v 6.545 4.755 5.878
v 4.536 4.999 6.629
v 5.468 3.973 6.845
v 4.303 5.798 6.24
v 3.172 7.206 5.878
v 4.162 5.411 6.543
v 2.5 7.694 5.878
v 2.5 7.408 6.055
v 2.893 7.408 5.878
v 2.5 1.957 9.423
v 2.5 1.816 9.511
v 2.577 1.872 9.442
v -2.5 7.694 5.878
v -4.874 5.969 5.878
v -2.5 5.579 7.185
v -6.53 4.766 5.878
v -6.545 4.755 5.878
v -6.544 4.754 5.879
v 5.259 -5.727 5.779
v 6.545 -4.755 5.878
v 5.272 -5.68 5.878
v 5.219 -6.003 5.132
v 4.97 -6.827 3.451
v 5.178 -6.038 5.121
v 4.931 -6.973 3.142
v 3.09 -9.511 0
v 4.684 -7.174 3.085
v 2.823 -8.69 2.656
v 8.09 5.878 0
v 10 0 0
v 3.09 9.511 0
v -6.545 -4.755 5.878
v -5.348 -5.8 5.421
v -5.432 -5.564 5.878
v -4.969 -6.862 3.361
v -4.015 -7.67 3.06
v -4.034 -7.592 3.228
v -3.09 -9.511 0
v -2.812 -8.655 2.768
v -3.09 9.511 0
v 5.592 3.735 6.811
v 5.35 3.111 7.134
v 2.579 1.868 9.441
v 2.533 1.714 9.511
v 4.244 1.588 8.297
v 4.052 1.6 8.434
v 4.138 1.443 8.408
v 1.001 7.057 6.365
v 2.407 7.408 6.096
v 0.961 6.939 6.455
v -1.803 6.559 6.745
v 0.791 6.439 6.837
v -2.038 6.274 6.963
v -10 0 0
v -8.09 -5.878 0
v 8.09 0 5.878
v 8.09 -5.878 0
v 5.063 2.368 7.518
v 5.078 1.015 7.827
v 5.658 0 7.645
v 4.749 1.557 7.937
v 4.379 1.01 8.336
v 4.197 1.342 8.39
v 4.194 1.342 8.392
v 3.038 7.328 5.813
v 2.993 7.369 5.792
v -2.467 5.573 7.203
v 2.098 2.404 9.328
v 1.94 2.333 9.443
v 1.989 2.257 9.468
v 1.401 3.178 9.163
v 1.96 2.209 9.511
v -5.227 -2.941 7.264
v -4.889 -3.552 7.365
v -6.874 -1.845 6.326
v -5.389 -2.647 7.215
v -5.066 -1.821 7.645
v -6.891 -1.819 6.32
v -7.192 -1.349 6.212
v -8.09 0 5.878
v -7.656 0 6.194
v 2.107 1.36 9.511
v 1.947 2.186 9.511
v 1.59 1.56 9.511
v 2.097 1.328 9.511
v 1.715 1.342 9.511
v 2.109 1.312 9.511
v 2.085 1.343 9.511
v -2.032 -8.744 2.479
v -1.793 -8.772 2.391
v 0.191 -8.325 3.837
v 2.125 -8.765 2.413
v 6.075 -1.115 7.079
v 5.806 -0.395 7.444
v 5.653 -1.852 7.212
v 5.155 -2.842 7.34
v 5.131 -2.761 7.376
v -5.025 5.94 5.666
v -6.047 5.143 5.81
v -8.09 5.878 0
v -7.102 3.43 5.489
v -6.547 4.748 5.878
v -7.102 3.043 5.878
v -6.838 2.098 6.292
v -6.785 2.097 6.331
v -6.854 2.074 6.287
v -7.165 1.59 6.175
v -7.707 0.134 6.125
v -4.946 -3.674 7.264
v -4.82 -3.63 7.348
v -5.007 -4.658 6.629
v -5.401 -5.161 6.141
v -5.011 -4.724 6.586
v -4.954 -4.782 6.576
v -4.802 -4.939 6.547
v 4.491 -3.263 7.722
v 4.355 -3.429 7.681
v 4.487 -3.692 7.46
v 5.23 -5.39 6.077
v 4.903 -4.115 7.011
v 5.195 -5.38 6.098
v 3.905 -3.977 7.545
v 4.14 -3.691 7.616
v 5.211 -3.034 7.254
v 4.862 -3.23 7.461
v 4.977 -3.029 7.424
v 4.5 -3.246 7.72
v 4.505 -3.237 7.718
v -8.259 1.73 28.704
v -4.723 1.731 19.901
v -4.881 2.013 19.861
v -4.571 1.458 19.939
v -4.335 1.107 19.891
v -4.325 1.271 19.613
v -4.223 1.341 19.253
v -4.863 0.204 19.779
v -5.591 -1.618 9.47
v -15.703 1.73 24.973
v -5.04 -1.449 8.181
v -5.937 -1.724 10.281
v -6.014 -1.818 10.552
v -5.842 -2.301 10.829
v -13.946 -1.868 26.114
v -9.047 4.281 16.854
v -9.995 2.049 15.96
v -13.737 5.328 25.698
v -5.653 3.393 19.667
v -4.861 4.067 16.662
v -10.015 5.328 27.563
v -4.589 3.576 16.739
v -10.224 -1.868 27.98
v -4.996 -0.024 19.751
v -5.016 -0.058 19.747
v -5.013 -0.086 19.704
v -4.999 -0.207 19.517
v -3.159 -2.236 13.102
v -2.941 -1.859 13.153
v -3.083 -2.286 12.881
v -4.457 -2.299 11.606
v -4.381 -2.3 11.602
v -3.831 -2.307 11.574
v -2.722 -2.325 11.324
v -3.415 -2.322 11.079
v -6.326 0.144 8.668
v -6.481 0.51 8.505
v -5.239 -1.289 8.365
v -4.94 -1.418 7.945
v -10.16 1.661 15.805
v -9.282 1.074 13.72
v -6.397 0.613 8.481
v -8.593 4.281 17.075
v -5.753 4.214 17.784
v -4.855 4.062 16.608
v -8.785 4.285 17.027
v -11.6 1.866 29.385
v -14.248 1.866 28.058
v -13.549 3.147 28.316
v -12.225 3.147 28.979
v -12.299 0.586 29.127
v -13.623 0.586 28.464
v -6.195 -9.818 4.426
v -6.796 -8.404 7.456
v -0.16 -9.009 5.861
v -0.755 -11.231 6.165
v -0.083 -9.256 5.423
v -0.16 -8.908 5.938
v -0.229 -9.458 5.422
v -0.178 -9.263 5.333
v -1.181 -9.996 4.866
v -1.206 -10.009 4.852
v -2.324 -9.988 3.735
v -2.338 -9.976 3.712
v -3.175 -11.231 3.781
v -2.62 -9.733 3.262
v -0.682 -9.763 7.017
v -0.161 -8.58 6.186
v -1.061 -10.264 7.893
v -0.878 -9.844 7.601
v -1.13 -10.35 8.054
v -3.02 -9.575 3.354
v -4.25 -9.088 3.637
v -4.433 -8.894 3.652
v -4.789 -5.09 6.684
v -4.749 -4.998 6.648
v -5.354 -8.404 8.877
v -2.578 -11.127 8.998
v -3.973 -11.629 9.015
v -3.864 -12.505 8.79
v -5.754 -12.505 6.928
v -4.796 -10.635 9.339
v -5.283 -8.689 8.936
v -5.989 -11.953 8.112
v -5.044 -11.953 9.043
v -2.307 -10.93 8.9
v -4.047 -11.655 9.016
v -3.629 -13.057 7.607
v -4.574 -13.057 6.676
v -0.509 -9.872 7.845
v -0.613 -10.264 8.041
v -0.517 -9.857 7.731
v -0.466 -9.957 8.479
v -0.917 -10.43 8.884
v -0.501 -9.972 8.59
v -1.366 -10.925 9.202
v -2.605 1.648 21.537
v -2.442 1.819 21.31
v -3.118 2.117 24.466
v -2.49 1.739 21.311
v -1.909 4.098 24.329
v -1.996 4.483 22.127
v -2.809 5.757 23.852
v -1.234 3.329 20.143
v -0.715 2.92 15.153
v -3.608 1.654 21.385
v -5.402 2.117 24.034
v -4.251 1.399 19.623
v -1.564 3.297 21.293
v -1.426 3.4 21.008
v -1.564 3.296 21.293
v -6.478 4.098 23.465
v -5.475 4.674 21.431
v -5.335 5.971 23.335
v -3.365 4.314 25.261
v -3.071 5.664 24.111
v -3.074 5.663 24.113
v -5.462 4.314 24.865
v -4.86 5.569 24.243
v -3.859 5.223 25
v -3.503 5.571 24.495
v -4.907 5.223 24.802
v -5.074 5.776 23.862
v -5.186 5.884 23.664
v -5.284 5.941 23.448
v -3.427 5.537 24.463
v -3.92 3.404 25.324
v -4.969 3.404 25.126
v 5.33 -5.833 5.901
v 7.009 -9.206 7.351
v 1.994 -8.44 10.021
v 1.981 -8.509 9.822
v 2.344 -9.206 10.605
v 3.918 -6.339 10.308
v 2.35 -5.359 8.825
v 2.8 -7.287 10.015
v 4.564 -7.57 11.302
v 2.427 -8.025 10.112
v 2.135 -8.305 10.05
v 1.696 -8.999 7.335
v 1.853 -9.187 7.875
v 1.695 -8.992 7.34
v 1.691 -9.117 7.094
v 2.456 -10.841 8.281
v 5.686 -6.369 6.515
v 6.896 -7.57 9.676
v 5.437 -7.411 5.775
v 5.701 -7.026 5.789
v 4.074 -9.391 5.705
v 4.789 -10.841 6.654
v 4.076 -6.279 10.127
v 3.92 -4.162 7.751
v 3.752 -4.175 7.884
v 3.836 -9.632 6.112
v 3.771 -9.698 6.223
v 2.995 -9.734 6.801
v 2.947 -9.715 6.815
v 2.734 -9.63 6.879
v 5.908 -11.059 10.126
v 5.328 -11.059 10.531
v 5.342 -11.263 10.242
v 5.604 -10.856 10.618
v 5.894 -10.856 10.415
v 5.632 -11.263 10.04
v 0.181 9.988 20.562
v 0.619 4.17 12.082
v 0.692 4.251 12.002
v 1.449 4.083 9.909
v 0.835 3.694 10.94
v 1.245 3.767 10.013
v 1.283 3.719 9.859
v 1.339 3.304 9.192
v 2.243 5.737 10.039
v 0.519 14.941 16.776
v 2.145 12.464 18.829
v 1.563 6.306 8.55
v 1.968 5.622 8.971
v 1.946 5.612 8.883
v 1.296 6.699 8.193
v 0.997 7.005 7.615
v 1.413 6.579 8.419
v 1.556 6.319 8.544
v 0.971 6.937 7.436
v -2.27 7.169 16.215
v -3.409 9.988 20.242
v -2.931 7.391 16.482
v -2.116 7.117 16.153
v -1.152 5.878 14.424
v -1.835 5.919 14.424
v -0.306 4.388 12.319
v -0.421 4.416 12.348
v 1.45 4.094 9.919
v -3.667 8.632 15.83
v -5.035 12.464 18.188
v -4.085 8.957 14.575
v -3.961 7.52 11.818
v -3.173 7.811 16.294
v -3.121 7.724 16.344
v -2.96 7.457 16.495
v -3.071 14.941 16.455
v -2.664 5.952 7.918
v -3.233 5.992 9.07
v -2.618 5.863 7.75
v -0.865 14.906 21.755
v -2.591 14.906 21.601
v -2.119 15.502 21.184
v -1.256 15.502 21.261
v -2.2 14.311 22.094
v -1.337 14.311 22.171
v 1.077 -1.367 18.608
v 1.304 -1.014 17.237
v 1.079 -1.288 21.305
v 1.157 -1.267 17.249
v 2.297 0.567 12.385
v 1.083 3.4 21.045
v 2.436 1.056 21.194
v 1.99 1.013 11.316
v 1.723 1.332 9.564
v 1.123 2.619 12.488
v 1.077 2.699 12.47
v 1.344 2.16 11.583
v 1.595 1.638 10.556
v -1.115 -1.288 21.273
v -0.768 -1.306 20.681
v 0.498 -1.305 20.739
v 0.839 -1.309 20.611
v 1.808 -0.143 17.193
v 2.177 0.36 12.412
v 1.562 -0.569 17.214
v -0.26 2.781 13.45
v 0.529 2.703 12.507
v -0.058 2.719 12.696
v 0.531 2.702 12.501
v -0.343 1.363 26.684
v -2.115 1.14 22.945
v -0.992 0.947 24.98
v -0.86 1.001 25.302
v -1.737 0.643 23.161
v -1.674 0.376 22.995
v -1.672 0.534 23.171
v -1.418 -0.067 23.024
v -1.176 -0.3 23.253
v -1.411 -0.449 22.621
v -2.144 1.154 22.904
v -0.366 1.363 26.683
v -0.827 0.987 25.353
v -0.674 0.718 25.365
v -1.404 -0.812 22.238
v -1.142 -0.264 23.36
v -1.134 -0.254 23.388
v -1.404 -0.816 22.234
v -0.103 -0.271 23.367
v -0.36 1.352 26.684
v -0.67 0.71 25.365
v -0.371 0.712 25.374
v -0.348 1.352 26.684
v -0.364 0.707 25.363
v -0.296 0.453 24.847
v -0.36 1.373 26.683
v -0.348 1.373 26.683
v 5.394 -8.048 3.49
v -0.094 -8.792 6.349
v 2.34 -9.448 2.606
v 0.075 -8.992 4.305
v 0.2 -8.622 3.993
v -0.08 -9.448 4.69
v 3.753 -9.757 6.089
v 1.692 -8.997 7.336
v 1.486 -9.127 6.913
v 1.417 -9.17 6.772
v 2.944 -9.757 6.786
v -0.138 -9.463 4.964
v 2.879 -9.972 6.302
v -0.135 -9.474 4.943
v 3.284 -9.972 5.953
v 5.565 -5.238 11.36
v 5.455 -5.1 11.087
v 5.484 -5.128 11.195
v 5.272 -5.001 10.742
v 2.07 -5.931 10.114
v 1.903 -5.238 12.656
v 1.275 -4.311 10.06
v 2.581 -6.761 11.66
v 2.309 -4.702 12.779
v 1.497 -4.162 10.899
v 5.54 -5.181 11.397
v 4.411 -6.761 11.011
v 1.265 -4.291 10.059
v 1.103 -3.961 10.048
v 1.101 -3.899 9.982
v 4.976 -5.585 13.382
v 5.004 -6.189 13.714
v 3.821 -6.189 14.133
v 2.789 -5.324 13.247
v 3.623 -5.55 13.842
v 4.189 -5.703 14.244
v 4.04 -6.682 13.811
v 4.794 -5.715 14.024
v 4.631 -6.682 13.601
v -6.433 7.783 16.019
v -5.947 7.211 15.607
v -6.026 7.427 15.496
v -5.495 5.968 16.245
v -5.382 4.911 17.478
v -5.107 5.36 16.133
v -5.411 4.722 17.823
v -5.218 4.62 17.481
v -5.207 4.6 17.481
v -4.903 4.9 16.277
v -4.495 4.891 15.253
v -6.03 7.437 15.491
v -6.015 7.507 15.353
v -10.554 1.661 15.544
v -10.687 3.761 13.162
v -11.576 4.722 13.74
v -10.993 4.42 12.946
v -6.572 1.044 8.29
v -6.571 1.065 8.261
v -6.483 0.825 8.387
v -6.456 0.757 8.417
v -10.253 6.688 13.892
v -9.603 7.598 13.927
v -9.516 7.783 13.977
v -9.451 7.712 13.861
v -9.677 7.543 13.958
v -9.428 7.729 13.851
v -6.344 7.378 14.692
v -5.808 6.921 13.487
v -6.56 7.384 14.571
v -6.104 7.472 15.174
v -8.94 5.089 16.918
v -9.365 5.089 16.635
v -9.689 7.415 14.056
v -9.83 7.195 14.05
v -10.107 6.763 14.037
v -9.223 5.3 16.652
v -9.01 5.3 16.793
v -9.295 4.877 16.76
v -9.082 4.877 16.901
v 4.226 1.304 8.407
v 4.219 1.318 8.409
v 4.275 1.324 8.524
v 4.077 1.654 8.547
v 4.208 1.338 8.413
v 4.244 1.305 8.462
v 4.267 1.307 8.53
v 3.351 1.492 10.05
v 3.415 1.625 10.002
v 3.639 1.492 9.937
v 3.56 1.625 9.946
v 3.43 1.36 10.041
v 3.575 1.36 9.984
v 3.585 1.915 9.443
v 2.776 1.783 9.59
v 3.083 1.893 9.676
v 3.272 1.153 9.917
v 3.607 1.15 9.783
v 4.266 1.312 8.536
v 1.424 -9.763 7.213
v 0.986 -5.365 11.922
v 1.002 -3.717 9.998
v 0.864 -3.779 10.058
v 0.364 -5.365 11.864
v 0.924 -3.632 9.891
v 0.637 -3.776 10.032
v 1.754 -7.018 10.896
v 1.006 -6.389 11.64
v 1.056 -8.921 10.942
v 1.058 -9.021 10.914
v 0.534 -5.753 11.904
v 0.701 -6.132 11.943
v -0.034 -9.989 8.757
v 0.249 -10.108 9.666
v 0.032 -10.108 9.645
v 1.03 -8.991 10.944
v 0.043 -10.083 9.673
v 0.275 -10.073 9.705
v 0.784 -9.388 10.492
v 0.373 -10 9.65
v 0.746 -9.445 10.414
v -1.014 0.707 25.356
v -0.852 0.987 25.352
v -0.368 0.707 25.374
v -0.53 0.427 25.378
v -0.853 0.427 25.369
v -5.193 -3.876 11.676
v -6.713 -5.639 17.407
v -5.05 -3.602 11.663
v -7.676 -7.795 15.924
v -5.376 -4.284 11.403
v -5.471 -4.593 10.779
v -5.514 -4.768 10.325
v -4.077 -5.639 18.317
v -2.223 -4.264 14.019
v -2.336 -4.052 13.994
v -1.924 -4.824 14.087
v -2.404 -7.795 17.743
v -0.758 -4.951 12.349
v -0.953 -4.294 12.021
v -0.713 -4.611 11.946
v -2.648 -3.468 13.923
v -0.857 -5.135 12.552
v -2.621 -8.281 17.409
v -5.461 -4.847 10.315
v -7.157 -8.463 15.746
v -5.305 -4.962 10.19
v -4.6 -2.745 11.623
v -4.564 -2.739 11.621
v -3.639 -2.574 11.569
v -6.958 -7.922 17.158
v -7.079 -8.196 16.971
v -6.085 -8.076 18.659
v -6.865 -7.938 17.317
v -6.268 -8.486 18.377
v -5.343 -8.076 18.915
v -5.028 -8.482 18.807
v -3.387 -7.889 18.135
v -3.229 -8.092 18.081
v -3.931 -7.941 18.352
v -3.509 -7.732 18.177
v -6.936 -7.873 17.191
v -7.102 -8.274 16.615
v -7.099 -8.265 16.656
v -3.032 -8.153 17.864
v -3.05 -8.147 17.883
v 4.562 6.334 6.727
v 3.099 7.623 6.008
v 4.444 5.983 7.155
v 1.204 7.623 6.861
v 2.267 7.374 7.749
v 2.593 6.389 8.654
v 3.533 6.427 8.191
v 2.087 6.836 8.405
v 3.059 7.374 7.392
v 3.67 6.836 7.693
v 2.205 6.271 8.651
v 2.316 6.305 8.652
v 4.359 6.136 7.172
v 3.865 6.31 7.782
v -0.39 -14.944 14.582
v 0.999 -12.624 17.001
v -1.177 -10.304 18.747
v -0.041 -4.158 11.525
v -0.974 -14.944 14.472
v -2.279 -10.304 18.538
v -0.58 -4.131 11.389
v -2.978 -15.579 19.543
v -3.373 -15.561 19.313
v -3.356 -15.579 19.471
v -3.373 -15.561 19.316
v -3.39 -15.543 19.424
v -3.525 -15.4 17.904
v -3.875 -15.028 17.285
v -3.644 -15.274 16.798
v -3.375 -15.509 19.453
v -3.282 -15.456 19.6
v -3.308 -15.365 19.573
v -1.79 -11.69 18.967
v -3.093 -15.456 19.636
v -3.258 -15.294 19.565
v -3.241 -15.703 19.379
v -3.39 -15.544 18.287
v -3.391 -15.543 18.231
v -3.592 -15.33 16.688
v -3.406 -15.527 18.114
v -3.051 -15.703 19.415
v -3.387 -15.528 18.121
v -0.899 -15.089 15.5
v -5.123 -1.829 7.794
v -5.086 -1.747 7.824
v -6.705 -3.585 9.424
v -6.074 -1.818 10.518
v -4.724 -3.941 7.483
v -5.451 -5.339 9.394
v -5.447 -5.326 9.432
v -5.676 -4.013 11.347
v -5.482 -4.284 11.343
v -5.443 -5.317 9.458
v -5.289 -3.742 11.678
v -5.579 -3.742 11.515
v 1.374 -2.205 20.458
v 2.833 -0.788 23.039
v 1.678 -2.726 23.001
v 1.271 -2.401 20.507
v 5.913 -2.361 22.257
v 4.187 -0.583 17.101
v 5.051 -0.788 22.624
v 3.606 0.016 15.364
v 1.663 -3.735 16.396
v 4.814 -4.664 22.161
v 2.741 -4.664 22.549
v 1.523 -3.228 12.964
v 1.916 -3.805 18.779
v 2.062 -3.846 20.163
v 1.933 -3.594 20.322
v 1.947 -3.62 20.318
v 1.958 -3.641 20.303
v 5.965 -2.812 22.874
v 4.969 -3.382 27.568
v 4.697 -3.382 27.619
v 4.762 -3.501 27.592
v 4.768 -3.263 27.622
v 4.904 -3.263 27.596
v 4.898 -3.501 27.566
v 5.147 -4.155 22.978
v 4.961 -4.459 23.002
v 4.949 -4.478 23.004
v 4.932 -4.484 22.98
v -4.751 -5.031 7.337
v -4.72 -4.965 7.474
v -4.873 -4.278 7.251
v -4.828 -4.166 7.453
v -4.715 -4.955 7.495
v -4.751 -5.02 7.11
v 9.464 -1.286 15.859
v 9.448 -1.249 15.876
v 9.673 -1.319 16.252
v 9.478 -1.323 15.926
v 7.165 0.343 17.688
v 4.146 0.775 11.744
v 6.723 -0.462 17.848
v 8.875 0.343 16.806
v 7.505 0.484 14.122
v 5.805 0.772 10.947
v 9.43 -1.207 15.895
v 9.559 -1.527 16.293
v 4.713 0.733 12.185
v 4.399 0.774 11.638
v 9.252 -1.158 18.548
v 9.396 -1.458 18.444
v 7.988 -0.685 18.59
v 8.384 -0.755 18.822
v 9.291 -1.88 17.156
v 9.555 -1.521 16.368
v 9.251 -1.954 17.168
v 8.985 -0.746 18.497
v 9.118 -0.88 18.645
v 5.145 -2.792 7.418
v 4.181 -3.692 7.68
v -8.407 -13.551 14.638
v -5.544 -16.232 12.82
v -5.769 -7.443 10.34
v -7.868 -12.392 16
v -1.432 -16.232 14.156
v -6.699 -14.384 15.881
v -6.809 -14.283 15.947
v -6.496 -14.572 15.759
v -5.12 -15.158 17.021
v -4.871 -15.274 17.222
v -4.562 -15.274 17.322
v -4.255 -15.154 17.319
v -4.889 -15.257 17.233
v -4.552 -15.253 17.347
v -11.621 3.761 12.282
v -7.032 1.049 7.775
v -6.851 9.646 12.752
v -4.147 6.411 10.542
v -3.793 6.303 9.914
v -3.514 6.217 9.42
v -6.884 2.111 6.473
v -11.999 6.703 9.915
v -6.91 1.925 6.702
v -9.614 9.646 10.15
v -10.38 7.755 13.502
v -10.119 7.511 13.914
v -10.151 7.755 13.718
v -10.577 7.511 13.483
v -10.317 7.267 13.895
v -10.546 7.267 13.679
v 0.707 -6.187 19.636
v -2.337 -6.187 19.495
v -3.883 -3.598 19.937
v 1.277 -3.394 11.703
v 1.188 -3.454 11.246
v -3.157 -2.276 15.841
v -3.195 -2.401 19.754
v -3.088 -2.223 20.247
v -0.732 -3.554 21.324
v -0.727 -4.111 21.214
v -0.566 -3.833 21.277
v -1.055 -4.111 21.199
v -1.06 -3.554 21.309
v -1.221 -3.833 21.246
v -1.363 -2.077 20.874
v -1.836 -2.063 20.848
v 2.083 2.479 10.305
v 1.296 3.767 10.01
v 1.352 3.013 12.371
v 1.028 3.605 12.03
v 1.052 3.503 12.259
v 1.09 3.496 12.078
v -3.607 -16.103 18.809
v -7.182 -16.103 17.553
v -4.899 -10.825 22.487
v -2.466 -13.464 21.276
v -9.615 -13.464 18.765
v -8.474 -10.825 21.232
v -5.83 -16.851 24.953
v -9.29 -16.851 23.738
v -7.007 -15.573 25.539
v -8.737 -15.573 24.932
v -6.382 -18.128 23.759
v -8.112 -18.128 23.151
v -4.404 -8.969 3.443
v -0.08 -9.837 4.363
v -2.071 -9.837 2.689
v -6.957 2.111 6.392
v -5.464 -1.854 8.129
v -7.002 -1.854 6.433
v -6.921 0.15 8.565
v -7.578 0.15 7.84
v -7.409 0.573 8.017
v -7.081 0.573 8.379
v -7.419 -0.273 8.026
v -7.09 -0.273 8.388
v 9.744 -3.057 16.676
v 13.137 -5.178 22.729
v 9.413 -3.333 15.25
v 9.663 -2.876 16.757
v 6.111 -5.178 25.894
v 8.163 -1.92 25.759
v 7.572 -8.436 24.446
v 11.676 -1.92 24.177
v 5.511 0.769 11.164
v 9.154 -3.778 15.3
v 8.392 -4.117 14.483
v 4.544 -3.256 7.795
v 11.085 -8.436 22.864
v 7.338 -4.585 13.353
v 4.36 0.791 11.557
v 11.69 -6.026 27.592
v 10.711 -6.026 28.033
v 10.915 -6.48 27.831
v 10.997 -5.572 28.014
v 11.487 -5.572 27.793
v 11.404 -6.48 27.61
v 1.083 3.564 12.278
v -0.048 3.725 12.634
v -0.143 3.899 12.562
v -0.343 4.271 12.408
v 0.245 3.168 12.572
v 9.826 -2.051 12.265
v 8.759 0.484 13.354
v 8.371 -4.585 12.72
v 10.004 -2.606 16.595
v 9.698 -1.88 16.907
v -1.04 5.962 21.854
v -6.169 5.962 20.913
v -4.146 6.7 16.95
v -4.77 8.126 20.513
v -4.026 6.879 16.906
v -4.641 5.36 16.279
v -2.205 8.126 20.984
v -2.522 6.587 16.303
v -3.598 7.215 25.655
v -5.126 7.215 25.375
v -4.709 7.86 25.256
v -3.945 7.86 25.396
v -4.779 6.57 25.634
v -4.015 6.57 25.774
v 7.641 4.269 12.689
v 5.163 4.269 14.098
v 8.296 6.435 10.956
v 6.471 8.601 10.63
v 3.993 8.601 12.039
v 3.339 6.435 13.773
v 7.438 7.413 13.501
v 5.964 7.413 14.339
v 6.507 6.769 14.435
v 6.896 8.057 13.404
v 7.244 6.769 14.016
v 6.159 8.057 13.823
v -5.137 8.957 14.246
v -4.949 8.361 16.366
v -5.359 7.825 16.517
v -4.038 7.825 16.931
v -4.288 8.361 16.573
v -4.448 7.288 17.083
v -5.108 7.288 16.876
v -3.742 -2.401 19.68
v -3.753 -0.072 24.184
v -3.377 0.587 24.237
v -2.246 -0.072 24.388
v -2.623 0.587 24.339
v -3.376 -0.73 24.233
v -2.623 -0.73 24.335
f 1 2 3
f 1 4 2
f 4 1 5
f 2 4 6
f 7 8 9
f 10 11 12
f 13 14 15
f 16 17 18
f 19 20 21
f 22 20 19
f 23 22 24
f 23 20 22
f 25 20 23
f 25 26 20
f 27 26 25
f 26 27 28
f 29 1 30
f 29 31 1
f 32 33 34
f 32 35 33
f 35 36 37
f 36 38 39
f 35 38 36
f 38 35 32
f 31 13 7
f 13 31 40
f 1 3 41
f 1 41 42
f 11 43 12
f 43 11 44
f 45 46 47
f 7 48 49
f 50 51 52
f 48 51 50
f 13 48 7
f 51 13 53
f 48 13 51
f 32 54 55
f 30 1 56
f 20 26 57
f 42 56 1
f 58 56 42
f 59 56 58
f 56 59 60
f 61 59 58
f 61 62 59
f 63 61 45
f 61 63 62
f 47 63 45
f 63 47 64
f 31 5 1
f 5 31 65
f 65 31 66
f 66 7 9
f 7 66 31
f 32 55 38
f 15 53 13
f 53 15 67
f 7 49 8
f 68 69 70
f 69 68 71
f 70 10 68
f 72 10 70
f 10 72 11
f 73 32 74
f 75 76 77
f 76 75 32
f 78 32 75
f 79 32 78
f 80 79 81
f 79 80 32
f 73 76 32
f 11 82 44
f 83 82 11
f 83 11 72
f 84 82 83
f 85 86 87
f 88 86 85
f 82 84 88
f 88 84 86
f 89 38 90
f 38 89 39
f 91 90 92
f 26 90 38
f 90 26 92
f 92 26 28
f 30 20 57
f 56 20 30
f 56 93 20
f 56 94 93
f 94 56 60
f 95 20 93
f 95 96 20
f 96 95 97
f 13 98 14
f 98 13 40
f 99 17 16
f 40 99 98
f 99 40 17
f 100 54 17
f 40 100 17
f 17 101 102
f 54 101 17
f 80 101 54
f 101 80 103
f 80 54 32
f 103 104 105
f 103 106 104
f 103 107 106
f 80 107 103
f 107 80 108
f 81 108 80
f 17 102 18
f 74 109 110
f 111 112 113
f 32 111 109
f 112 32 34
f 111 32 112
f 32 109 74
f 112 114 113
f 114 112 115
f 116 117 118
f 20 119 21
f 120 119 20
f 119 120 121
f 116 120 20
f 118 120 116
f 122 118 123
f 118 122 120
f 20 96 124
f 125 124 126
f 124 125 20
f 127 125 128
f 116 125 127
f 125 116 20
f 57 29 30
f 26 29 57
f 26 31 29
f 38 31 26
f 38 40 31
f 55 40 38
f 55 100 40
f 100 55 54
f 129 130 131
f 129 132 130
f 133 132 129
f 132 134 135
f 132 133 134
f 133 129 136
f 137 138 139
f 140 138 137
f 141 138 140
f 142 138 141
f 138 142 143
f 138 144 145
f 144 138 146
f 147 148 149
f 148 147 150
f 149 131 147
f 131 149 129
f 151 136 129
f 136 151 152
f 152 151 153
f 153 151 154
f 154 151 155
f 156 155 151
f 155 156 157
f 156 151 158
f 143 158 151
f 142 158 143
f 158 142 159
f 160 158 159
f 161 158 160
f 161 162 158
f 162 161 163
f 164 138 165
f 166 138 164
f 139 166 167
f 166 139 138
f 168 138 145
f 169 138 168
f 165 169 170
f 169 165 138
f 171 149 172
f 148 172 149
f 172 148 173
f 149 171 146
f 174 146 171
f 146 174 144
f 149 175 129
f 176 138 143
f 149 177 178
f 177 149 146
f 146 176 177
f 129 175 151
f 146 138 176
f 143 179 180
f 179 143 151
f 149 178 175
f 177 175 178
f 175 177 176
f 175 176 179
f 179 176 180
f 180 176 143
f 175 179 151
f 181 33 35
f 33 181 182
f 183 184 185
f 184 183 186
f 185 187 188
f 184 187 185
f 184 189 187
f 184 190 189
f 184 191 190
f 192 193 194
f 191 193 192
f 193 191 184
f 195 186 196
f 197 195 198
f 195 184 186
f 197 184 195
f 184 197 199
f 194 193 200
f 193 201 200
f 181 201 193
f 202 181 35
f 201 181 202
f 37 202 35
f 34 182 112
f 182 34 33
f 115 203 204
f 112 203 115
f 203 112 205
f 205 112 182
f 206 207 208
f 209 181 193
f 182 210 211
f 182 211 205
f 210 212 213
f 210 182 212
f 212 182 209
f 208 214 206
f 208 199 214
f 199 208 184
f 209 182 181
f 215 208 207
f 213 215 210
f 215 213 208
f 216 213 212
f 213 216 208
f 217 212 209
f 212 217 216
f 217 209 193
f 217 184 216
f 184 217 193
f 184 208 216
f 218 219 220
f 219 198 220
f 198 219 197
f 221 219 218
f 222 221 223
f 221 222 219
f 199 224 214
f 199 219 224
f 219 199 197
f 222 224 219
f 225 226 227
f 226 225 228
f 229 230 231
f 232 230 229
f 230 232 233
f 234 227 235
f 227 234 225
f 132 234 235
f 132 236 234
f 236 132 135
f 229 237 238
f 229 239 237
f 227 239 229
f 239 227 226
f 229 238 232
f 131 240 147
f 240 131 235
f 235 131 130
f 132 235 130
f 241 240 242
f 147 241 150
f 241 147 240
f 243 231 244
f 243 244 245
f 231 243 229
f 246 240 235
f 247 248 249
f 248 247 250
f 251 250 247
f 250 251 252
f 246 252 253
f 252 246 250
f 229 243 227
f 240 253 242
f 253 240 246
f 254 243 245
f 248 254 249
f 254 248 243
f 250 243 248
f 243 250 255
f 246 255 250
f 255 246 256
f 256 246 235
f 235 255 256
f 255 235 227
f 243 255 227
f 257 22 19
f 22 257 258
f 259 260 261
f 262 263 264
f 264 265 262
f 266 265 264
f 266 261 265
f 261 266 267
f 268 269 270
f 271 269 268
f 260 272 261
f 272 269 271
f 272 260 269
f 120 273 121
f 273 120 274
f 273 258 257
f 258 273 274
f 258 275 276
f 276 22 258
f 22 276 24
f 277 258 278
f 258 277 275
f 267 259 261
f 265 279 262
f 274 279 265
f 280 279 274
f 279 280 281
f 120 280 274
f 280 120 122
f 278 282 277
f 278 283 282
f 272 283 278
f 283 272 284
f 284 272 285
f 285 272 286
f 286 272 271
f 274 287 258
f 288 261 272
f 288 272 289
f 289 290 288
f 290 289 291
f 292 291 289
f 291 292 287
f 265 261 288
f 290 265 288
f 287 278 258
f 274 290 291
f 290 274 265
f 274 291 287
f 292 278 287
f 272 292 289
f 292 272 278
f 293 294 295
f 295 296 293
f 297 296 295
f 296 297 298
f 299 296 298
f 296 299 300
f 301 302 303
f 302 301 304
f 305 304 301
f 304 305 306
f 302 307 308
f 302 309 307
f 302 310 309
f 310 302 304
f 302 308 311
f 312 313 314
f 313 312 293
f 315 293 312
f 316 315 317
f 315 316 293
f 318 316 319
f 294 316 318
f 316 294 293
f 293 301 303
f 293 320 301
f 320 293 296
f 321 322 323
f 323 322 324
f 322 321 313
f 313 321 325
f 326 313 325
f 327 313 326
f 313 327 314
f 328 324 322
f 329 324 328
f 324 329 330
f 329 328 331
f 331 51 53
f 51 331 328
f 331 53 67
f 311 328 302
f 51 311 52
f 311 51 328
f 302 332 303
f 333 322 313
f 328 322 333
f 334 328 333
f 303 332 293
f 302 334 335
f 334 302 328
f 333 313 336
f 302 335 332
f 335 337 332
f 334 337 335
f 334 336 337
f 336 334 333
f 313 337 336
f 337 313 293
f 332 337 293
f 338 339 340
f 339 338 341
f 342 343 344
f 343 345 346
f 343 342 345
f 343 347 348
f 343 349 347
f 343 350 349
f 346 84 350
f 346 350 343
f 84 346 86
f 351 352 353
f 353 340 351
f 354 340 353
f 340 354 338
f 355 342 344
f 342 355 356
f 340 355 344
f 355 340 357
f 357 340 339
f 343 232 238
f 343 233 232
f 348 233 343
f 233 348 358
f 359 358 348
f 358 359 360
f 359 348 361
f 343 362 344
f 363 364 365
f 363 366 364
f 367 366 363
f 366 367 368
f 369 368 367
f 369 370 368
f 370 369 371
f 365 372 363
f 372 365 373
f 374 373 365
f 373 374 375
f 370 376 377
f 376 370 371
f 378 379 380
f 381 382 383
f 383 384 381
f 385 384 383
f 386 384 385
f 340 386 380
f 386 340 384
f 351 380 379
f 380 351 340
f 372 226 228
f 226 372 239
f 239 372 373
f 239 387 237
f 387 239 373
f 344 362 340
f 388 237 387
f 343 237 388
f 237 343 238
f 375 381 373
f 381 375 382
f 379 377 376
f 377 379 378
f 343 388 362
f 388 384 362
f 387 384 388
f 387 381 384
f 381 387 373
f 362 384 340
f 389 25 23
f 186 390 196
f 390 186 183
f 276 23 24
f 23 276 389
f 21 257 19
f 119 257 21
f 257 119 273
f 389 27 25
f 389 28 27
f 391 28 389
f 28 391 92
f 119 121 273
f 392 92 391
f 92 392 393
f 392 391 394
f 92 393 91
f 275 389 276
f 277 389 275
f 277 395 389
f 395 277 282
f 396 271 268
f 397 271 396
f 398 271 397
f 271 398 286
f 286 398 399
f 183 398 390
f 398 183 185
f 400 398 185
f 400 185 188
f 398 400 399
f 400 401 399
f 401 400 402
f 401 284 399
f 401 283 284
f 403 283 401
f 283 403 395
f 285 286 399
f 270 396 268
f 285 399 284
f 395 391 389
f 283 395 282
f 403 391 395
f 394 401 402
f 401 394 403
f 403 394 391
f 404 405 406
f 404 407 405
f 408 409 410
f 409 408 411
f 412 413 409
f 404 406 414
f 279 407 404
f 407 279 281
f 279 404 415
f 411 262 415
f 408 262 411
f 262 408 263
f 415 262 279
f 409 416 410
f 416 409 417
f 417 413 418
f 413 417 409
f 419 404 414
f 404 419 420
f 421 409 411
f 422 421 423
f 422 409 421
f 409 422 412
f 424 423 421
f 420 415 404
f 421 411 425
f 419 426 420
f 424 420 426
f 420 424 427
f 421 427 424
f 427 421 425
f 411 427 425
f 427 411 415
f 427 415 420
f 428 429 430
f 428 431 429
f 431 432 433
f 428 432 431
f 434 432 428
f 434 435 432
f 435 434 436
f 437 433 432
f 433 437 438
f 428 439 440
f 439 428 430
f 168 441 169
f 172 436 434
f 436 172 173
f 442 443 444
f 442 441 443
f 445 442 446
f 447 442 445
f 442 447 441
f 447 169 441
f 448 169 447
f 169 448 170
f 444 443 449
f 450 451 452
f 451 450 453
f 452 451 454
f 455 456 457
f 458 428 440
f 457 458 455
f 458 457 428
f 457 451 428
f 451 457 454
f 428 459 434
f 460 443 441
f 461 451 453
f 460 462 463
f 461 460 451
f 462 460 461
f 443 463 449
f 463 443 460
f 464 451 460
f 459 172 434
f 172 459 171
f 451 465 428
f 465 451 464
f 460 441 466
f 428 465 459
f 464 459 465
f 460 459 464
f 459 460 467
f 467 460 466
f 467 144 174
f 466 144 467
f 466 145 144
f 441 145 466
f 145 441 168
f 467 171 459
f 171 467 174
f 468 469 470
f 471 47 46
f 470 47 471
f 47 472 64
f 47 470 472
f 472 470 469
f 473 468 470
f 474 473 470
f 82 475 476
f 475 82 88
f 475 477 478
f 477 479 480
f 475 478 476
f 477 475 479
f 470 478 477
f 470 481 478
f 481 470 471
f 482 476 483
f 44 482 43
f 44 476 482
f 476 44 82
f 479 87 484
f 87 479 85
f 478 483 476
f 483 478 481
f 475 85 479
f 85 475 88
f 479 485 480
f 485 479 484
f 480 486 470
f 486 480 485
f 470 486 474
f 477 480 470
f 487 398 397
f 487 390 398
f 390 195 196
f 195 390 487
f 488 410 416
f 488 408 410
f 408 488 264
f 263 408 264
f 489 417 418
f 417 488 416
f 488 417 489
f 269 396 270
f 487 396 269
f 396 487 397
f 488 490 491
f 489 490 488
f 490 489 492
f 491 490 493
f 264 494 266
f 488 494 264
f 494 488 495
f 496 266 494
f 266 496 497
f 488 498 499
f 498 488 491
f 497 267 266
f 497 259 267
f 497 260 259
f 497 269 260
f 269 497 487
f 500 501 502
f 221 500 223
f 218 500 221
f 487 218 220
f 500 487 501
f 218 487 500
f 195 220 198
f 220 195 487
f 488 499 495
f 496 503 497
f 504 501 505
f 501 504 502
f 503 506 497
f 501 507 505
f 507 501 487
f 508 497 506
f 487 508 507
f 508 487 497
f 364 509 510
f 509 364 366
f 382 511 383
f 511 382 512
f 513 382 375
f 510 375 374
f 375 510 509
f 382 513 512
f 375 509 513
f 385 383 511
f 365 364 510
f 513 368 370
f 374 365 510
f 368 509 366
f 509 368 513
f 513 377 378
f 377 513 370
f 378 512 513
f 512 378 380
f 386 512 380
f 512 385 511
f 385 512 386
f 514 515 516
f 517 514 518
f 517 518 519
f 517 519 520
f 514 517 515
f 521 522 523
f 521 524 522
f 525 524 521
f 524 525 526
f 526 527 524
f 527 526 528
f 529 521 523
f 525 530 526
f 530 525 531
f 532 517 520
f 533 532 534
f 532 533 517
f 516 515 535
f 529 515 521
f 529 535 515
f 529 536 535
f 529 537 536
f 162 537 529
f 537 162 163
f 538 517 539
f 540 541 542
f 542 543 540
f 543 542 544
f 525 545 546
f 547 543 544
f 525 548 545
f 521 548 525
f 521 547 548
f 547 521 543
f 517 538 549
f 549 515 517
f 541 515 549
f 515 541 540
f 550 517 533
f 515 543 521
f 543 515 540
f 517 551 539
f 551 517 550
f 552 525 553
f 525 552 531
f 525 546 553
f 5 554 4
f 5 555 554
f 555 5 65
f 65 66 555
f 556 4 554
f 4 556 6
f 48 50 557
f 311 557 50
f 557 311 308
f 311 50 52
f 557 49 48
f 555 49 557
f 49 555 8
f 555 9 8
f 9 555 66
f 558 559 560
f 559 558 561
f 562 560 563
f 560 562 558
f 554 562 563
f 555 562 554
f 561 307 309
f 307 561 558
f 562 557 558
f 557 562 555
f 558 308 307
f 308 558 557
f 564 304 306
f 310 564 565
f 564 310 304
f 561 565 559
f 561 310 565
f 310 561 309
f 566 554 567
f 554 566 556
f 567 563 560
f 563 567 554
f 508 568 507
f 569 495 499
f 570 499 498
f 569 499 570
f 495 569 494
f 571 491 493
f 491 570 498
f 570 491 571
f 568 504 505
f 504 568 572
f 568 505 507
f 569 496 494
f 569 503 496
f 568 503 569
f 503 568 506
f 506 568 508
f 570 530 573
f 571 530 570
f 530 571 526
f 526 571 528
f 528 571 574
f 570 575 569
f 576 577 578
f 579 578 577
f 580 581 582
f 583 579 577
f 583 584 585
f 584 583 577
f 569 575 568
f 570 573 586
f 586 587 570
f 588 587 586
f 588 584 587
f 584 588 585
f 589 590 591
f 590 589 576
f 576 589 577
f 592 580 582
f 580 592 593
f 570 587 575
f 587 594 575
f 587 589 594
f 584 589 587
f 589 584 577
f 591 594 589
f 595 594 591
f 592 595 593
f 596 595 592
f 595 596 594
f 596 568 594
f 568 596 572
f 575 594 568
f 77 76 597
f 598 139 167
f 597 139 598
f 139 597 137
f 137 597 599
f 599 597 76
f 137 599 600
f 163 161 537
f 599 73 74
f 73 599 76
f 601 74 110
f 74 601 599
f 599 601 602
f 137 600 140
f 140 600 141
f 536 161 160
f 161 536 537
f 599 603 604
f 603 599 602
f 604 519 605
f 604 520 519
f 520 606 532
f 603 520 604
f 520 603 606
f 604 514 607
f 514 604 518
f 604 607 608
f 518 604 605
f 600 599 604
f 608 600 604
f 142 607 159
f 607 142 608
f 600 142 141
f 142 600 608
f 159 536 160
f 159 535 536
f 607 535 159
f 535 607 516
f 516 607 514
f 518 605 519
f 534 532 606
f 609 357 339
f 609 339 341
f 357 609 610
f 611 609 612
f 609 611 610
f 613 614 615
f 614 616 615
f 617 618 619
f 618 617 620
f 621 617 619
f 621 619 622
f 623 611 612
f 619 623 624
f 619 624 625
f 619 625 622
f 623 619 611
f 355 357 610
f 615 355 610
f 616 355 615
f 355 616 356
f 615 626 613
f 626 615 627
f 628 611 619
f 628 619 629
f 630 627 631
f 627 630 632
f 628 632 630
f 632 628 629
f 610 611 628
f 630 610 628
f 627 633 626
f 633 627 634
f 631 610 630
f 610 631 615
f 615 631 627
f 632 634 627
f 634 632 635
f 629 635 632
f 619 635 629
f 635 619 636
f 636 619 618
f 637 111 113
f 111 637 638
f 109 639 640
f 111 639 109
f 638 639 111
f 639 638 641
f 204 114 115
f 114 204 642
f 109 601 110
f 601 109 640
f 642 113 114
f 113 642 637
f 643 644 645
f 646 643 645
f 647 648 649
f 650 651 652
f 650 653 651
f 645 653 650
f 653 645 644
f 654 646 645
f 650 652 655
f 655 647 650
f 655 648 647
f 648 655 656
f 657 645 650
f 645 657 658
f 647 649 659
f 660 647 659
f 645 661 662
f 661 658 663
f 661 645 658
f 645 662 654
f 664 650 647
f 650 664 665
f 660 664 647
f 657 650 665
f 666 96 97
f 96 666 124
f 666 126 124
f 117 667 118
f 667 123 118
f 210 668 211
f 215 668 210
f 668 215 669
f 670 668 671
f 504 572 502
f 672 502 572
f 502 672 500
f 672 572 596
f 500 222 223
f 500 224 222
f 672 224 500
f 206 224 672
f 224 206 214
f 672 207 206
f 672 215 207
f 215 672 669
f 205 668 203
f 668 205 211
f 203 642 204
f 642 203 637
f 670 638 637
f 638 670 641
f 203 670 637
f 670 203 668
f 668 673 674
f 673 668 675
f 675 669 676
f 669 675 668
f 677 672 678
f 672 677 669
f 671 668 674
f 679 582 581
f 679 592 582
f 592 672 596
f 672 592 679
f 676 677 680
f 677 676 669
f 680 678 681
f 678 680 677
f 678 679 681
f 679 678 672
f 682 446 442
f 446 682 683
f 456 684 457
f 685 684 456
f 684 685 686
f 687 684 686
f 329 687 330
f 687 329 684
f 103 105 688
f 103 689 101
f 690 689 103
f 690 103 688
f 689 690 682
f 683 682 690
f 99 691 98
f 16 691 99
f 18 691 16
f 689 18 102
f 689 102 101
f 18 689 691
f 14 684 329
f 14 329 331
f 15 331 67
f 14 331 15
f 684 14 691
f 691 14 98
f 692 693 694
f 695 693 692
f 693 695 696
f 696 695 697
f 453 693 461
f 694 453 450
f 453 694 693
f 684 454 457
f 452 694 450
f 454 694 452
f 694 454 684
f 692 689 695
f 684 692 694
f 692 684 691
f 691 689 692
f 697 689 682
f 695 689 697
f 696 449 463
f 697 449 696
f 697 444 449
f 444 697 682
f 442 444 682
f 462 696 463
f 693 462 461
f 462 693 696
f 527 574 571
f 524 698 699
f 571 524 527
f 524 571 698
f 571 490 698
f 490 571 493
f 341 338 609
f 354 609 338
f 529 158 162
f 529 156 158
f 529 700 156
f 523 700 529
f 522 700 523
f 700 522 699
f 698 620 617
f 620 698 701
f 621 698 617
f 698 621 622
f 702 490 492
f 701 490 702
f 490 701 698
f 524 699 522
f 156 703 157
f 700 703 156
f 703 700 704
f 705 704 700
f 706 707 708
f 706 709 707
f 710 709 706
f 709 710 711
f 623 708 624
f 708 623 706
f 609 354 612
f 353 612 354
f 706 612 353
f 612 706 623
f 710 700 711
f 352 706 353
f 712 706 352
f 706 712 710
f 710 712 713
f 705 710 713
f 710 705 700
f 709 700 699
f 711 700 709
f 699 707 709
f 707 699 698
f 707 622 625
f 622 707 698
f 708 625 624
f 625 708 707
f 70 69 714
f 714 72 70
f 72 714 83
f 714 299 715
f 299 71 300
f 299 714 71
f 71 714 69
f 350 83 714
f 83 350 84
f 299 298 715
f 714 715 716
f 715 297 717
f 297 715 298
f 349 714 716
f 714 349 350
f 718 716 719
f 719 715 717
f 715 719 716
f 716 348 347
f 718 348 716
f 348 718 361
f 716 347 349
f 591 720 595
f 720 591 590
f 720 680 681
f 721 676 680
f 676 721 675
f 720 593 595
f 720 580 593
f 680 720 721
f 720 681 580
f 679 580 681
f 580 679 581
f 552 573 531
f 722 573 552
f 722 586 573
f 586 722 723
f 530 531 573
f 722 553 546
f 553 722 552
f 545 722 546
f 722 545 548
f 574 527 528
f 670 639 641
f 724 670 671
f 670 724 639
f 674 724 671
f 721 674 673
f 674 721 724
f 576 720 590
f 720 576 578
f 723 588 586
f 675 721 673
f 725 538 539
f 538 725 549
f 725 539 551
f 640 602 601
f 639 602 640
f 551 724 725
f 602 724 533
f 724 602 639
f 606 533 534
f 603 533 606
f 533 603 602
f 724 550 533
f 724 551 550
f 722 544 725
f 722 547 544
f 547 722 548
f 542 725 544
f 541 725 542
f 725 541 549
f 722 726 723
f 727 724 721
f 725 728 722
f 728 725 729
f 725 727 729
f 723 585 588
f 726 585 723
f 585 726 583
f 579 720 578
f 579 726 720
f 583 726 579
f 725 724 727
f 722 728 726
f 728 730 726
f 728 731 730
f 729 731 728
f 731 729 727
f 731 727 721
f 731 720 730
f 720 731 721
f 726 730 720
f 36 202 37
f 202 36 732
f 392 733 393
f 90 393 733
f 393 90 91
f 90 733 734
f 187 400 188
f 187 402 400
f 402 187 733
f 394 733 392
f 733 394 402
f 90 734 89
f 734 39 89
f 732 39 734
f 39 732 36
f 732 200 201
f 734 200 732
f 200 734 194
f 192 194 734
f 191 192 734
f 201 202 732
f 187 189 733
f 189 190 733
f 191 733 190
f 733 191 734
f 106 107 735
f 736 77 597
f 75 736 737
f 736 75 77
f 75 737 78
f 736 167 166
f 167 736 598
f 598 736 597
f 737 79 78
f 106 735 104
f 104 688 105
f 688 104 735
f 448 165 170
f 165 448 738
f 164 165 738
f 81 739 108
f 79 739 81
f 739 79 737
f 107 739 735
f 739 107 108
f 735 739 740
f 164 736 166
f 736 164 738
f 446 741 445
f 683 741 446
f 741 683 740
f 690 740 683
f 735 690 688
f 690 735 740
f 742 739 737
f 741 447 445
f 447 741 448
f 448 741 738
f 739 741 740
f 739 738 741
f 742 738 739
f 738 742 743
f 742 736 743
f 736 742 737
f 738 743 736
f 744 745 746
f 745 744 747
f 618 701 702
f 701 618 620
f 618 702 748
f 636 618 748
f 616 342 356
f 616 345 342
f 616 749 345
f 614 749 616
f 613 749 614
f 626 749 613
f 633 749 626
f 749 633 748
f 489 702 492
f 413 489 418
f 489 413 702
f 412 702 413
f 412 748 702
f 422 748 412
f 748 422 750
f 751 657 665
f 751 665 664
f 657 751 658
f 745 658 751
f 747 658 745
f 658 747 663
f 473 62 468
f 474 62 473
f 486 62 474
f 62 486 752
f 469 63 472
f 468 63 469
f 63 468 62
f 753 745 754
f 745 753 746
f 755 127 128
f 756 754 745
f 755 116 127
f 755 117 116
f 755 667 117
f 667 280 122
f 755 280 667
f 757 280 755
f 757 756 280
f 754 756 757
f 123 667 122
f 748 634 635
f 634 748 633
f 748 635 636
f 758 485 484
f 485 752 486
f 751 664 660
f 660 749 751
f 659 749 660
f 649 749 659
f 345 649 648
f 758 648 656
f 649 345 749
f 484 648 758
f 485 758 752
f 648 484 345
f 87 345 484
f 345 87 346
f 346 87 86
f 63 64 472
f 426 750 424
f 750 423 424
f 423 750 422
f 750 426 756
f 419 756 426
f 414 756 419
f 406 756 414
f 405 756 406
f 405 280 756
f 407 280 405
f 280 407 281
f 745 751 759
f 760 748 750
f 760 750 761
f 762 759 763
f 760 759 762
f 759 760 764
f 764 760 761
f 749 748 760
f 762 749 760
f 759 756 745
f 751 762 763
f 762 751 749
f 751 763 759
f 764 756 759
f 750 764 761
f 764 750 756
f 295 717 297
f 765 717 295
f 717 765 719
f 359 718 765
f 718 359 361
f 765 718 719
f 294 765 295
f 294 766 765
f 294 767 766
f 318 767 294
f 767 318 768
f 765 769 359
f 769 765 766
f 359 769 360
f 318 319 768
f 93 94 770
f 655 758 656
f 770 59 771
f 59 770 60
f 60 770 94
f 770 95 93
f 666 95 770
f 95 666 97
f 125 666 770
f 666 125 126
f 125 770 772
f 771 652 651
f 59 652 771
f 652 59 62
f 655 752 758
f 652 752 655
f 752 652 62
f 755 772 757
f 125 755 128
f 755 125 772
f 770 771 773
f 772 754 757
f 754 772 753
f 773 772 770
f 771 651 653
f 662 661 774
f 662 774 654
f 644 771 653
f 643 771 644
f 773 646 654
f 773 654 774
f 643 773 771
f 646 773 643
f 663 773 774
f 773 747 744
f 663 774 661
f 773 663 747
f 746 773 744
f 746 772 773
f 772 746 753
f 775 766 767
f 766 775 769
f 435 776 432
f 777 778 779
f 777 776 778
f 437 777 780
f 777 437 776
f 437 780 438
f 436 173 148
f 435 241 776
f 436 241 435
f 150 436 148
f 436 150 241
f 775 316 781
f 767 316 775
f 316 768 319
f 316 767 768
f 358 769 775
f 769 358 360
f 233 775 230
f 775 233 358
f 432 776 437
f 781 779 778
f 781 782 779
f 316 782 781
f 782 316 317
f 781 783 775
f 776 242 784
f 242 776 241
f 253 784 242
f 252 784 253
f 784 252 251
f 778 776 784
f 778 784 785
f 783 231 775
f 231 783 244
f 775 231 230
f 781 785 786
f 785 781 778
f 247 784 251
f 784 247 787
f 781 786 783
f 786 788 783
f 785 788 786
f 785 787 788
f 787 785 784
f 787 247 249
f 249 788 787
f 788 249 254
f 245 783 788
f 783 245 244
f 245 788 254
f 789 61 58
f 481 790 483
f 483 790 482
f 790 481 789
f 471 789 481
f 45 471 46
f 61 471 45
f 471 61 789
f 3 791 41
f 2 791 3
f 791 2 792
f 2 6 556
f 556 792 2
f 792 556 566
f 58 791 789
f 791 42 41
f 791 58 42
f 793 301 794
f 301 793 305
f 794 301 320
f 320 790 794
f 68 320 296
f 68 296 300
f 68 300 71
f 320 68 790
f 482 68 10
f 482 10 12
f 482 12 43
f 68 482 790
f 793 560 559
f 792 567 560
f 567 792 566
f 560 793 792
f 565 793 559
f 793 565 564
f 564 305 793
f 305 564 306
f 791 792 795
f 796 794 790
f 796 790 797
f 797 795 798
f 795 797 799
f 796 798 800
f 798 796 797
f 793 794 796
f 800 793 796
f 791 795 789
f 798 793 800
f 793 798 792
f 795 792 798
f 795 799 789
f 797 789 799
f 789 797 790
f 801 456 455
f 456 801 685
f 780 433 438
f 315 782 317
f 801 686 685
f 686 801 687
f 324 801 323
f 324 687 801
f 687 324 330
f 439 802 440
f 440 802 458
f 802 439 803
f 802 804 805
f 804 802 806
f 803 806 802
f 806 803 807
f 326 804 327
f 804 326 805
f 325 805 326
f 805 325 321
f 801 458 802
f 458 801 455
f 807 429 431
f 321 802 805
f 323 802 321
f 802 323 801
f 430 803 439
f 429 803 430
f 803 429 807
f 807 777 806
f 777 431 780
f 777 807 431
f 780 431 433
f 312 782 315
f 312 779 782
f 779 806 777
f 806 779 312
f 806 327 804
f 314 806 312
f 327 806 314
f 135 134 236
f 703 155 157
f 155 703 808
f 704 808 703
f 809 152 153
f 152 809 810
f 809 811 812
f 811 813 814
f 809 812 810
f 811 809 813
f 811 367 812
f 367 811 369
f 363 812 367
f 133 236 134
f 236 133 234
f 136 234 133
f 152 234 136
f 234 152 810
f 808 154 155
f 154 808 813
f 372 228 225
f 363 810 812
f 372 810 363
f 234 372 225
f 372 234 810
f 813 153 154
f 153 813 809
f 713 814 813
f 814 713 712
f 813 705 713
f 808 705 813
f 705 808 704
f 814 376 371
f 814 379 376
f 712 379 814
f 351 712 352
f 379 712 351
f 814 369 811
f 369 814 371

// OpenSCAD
/*
Random crystal generator for Thingiverse Customizer
by Fernando Jerez 2016

Ugraded by Teevax 01-2017

Refactored and fully parametrized by Kraplax 2019-10

*/

/* [Crystals' Base] */
// The width of the base to grow crystals on
base_radius = 10; // [8:0.5:20]

// Number of facets of base to grow crystals on
base_sides = 10; // [5:1:50]

/* [Crystals] */
// Whether to generate crystals of same sides count or randomize
randomize_crystal_sides = false; // [false: Same, true: Random]

// How many sides/facets for crystals (if randomized, used as max facets, 3 being as minimum random value)
crystal_sides = 6; // [3:1:10]

// How many crystals to grow
crystals_count = 50; // [10:1:50]

// Cofficient to modify crystal radius at it's base
base_radius_percents = 100; // [1:1:200]

// Cofficient to modify crystal's body radius
body_radius_percents = 100; // [1:1:200]

// Cofficient to modify crystal's tip radius
tip_radius_percents = 100; // [1:1:200]

// Cofficient to modify crystal's tip length
tip_length_percents = 100; // [1:1:200]

/* [Hidden] */
base_radius_coefficient = base_radius_percents / 100;
body_radius_coefficient = body_radius_percents / 100;
tip_radius_coefficient = tip_radius_percents / 100;
tip_length_coefficient = tip_length_percents / 100;

crystalrock();

module crystalrock(){
    union(){
        semisphere(base_radius,$fn=base_sides);
        for(i=[1:crystals_count]){
            maxAngleX = 70;
            maxAngleY = 50;
            g1 = rands(-maxAngleX, maxAngleX, 1)[0];
            g2 = rands(-maxAngleY, maxAngleY, 1)[0];
            
            sidesCount = crystal_sides;
            if (randomize_crystal_sides) {
                sidesCount = rands(3, crystal_sides);
            }
            bottomRadius = rands(1, 3, 1)[0] * base_radius_coefficient;
            widestRadius = rands(1.1, 1.6, 1)[0] * bottomRadius * body_radius_coefficient;
            tipRadius = rands(0, 0.5, 1)[0] * widestRadius * tip_radius_coefficient;
            baseLength = bottomRadius
                * rands(1, 2, 1)[0]
                * 5
                * (0.5 + pow((abs(cos(g1) * cos(g2))), 4));
            tipLength = rands(0.05, 0.3, 1)[0] * baseLength * tip_length_coefficient;

            translate([0, 0, bottomRadius])
            rotate([g1, g2, 0])
            crystal(sidesCount, bottomRadius, widestRadius, tipRadius, baseLength, tipLength);
        }
    }
}

module crystal(sidesCount, bottomRadius, widestRadius, tipRadius, baseLength, tipLength) {
    cylinder(r1=bottomRadius, r2=widestRadius, h=baseLength, $fn=sidesCount);
    translate([0, 0, baseLength])
    cylinder(r1=widestRadius, r2=tipRadius, h=tipLength, $fn=sidesCount);
    
}

module semisphere(r) {
    difference(){
        sphere(r); 
        translate([0,0,-r]) cube([2*r, 2*r, 2*r], center = true);
    }
}
